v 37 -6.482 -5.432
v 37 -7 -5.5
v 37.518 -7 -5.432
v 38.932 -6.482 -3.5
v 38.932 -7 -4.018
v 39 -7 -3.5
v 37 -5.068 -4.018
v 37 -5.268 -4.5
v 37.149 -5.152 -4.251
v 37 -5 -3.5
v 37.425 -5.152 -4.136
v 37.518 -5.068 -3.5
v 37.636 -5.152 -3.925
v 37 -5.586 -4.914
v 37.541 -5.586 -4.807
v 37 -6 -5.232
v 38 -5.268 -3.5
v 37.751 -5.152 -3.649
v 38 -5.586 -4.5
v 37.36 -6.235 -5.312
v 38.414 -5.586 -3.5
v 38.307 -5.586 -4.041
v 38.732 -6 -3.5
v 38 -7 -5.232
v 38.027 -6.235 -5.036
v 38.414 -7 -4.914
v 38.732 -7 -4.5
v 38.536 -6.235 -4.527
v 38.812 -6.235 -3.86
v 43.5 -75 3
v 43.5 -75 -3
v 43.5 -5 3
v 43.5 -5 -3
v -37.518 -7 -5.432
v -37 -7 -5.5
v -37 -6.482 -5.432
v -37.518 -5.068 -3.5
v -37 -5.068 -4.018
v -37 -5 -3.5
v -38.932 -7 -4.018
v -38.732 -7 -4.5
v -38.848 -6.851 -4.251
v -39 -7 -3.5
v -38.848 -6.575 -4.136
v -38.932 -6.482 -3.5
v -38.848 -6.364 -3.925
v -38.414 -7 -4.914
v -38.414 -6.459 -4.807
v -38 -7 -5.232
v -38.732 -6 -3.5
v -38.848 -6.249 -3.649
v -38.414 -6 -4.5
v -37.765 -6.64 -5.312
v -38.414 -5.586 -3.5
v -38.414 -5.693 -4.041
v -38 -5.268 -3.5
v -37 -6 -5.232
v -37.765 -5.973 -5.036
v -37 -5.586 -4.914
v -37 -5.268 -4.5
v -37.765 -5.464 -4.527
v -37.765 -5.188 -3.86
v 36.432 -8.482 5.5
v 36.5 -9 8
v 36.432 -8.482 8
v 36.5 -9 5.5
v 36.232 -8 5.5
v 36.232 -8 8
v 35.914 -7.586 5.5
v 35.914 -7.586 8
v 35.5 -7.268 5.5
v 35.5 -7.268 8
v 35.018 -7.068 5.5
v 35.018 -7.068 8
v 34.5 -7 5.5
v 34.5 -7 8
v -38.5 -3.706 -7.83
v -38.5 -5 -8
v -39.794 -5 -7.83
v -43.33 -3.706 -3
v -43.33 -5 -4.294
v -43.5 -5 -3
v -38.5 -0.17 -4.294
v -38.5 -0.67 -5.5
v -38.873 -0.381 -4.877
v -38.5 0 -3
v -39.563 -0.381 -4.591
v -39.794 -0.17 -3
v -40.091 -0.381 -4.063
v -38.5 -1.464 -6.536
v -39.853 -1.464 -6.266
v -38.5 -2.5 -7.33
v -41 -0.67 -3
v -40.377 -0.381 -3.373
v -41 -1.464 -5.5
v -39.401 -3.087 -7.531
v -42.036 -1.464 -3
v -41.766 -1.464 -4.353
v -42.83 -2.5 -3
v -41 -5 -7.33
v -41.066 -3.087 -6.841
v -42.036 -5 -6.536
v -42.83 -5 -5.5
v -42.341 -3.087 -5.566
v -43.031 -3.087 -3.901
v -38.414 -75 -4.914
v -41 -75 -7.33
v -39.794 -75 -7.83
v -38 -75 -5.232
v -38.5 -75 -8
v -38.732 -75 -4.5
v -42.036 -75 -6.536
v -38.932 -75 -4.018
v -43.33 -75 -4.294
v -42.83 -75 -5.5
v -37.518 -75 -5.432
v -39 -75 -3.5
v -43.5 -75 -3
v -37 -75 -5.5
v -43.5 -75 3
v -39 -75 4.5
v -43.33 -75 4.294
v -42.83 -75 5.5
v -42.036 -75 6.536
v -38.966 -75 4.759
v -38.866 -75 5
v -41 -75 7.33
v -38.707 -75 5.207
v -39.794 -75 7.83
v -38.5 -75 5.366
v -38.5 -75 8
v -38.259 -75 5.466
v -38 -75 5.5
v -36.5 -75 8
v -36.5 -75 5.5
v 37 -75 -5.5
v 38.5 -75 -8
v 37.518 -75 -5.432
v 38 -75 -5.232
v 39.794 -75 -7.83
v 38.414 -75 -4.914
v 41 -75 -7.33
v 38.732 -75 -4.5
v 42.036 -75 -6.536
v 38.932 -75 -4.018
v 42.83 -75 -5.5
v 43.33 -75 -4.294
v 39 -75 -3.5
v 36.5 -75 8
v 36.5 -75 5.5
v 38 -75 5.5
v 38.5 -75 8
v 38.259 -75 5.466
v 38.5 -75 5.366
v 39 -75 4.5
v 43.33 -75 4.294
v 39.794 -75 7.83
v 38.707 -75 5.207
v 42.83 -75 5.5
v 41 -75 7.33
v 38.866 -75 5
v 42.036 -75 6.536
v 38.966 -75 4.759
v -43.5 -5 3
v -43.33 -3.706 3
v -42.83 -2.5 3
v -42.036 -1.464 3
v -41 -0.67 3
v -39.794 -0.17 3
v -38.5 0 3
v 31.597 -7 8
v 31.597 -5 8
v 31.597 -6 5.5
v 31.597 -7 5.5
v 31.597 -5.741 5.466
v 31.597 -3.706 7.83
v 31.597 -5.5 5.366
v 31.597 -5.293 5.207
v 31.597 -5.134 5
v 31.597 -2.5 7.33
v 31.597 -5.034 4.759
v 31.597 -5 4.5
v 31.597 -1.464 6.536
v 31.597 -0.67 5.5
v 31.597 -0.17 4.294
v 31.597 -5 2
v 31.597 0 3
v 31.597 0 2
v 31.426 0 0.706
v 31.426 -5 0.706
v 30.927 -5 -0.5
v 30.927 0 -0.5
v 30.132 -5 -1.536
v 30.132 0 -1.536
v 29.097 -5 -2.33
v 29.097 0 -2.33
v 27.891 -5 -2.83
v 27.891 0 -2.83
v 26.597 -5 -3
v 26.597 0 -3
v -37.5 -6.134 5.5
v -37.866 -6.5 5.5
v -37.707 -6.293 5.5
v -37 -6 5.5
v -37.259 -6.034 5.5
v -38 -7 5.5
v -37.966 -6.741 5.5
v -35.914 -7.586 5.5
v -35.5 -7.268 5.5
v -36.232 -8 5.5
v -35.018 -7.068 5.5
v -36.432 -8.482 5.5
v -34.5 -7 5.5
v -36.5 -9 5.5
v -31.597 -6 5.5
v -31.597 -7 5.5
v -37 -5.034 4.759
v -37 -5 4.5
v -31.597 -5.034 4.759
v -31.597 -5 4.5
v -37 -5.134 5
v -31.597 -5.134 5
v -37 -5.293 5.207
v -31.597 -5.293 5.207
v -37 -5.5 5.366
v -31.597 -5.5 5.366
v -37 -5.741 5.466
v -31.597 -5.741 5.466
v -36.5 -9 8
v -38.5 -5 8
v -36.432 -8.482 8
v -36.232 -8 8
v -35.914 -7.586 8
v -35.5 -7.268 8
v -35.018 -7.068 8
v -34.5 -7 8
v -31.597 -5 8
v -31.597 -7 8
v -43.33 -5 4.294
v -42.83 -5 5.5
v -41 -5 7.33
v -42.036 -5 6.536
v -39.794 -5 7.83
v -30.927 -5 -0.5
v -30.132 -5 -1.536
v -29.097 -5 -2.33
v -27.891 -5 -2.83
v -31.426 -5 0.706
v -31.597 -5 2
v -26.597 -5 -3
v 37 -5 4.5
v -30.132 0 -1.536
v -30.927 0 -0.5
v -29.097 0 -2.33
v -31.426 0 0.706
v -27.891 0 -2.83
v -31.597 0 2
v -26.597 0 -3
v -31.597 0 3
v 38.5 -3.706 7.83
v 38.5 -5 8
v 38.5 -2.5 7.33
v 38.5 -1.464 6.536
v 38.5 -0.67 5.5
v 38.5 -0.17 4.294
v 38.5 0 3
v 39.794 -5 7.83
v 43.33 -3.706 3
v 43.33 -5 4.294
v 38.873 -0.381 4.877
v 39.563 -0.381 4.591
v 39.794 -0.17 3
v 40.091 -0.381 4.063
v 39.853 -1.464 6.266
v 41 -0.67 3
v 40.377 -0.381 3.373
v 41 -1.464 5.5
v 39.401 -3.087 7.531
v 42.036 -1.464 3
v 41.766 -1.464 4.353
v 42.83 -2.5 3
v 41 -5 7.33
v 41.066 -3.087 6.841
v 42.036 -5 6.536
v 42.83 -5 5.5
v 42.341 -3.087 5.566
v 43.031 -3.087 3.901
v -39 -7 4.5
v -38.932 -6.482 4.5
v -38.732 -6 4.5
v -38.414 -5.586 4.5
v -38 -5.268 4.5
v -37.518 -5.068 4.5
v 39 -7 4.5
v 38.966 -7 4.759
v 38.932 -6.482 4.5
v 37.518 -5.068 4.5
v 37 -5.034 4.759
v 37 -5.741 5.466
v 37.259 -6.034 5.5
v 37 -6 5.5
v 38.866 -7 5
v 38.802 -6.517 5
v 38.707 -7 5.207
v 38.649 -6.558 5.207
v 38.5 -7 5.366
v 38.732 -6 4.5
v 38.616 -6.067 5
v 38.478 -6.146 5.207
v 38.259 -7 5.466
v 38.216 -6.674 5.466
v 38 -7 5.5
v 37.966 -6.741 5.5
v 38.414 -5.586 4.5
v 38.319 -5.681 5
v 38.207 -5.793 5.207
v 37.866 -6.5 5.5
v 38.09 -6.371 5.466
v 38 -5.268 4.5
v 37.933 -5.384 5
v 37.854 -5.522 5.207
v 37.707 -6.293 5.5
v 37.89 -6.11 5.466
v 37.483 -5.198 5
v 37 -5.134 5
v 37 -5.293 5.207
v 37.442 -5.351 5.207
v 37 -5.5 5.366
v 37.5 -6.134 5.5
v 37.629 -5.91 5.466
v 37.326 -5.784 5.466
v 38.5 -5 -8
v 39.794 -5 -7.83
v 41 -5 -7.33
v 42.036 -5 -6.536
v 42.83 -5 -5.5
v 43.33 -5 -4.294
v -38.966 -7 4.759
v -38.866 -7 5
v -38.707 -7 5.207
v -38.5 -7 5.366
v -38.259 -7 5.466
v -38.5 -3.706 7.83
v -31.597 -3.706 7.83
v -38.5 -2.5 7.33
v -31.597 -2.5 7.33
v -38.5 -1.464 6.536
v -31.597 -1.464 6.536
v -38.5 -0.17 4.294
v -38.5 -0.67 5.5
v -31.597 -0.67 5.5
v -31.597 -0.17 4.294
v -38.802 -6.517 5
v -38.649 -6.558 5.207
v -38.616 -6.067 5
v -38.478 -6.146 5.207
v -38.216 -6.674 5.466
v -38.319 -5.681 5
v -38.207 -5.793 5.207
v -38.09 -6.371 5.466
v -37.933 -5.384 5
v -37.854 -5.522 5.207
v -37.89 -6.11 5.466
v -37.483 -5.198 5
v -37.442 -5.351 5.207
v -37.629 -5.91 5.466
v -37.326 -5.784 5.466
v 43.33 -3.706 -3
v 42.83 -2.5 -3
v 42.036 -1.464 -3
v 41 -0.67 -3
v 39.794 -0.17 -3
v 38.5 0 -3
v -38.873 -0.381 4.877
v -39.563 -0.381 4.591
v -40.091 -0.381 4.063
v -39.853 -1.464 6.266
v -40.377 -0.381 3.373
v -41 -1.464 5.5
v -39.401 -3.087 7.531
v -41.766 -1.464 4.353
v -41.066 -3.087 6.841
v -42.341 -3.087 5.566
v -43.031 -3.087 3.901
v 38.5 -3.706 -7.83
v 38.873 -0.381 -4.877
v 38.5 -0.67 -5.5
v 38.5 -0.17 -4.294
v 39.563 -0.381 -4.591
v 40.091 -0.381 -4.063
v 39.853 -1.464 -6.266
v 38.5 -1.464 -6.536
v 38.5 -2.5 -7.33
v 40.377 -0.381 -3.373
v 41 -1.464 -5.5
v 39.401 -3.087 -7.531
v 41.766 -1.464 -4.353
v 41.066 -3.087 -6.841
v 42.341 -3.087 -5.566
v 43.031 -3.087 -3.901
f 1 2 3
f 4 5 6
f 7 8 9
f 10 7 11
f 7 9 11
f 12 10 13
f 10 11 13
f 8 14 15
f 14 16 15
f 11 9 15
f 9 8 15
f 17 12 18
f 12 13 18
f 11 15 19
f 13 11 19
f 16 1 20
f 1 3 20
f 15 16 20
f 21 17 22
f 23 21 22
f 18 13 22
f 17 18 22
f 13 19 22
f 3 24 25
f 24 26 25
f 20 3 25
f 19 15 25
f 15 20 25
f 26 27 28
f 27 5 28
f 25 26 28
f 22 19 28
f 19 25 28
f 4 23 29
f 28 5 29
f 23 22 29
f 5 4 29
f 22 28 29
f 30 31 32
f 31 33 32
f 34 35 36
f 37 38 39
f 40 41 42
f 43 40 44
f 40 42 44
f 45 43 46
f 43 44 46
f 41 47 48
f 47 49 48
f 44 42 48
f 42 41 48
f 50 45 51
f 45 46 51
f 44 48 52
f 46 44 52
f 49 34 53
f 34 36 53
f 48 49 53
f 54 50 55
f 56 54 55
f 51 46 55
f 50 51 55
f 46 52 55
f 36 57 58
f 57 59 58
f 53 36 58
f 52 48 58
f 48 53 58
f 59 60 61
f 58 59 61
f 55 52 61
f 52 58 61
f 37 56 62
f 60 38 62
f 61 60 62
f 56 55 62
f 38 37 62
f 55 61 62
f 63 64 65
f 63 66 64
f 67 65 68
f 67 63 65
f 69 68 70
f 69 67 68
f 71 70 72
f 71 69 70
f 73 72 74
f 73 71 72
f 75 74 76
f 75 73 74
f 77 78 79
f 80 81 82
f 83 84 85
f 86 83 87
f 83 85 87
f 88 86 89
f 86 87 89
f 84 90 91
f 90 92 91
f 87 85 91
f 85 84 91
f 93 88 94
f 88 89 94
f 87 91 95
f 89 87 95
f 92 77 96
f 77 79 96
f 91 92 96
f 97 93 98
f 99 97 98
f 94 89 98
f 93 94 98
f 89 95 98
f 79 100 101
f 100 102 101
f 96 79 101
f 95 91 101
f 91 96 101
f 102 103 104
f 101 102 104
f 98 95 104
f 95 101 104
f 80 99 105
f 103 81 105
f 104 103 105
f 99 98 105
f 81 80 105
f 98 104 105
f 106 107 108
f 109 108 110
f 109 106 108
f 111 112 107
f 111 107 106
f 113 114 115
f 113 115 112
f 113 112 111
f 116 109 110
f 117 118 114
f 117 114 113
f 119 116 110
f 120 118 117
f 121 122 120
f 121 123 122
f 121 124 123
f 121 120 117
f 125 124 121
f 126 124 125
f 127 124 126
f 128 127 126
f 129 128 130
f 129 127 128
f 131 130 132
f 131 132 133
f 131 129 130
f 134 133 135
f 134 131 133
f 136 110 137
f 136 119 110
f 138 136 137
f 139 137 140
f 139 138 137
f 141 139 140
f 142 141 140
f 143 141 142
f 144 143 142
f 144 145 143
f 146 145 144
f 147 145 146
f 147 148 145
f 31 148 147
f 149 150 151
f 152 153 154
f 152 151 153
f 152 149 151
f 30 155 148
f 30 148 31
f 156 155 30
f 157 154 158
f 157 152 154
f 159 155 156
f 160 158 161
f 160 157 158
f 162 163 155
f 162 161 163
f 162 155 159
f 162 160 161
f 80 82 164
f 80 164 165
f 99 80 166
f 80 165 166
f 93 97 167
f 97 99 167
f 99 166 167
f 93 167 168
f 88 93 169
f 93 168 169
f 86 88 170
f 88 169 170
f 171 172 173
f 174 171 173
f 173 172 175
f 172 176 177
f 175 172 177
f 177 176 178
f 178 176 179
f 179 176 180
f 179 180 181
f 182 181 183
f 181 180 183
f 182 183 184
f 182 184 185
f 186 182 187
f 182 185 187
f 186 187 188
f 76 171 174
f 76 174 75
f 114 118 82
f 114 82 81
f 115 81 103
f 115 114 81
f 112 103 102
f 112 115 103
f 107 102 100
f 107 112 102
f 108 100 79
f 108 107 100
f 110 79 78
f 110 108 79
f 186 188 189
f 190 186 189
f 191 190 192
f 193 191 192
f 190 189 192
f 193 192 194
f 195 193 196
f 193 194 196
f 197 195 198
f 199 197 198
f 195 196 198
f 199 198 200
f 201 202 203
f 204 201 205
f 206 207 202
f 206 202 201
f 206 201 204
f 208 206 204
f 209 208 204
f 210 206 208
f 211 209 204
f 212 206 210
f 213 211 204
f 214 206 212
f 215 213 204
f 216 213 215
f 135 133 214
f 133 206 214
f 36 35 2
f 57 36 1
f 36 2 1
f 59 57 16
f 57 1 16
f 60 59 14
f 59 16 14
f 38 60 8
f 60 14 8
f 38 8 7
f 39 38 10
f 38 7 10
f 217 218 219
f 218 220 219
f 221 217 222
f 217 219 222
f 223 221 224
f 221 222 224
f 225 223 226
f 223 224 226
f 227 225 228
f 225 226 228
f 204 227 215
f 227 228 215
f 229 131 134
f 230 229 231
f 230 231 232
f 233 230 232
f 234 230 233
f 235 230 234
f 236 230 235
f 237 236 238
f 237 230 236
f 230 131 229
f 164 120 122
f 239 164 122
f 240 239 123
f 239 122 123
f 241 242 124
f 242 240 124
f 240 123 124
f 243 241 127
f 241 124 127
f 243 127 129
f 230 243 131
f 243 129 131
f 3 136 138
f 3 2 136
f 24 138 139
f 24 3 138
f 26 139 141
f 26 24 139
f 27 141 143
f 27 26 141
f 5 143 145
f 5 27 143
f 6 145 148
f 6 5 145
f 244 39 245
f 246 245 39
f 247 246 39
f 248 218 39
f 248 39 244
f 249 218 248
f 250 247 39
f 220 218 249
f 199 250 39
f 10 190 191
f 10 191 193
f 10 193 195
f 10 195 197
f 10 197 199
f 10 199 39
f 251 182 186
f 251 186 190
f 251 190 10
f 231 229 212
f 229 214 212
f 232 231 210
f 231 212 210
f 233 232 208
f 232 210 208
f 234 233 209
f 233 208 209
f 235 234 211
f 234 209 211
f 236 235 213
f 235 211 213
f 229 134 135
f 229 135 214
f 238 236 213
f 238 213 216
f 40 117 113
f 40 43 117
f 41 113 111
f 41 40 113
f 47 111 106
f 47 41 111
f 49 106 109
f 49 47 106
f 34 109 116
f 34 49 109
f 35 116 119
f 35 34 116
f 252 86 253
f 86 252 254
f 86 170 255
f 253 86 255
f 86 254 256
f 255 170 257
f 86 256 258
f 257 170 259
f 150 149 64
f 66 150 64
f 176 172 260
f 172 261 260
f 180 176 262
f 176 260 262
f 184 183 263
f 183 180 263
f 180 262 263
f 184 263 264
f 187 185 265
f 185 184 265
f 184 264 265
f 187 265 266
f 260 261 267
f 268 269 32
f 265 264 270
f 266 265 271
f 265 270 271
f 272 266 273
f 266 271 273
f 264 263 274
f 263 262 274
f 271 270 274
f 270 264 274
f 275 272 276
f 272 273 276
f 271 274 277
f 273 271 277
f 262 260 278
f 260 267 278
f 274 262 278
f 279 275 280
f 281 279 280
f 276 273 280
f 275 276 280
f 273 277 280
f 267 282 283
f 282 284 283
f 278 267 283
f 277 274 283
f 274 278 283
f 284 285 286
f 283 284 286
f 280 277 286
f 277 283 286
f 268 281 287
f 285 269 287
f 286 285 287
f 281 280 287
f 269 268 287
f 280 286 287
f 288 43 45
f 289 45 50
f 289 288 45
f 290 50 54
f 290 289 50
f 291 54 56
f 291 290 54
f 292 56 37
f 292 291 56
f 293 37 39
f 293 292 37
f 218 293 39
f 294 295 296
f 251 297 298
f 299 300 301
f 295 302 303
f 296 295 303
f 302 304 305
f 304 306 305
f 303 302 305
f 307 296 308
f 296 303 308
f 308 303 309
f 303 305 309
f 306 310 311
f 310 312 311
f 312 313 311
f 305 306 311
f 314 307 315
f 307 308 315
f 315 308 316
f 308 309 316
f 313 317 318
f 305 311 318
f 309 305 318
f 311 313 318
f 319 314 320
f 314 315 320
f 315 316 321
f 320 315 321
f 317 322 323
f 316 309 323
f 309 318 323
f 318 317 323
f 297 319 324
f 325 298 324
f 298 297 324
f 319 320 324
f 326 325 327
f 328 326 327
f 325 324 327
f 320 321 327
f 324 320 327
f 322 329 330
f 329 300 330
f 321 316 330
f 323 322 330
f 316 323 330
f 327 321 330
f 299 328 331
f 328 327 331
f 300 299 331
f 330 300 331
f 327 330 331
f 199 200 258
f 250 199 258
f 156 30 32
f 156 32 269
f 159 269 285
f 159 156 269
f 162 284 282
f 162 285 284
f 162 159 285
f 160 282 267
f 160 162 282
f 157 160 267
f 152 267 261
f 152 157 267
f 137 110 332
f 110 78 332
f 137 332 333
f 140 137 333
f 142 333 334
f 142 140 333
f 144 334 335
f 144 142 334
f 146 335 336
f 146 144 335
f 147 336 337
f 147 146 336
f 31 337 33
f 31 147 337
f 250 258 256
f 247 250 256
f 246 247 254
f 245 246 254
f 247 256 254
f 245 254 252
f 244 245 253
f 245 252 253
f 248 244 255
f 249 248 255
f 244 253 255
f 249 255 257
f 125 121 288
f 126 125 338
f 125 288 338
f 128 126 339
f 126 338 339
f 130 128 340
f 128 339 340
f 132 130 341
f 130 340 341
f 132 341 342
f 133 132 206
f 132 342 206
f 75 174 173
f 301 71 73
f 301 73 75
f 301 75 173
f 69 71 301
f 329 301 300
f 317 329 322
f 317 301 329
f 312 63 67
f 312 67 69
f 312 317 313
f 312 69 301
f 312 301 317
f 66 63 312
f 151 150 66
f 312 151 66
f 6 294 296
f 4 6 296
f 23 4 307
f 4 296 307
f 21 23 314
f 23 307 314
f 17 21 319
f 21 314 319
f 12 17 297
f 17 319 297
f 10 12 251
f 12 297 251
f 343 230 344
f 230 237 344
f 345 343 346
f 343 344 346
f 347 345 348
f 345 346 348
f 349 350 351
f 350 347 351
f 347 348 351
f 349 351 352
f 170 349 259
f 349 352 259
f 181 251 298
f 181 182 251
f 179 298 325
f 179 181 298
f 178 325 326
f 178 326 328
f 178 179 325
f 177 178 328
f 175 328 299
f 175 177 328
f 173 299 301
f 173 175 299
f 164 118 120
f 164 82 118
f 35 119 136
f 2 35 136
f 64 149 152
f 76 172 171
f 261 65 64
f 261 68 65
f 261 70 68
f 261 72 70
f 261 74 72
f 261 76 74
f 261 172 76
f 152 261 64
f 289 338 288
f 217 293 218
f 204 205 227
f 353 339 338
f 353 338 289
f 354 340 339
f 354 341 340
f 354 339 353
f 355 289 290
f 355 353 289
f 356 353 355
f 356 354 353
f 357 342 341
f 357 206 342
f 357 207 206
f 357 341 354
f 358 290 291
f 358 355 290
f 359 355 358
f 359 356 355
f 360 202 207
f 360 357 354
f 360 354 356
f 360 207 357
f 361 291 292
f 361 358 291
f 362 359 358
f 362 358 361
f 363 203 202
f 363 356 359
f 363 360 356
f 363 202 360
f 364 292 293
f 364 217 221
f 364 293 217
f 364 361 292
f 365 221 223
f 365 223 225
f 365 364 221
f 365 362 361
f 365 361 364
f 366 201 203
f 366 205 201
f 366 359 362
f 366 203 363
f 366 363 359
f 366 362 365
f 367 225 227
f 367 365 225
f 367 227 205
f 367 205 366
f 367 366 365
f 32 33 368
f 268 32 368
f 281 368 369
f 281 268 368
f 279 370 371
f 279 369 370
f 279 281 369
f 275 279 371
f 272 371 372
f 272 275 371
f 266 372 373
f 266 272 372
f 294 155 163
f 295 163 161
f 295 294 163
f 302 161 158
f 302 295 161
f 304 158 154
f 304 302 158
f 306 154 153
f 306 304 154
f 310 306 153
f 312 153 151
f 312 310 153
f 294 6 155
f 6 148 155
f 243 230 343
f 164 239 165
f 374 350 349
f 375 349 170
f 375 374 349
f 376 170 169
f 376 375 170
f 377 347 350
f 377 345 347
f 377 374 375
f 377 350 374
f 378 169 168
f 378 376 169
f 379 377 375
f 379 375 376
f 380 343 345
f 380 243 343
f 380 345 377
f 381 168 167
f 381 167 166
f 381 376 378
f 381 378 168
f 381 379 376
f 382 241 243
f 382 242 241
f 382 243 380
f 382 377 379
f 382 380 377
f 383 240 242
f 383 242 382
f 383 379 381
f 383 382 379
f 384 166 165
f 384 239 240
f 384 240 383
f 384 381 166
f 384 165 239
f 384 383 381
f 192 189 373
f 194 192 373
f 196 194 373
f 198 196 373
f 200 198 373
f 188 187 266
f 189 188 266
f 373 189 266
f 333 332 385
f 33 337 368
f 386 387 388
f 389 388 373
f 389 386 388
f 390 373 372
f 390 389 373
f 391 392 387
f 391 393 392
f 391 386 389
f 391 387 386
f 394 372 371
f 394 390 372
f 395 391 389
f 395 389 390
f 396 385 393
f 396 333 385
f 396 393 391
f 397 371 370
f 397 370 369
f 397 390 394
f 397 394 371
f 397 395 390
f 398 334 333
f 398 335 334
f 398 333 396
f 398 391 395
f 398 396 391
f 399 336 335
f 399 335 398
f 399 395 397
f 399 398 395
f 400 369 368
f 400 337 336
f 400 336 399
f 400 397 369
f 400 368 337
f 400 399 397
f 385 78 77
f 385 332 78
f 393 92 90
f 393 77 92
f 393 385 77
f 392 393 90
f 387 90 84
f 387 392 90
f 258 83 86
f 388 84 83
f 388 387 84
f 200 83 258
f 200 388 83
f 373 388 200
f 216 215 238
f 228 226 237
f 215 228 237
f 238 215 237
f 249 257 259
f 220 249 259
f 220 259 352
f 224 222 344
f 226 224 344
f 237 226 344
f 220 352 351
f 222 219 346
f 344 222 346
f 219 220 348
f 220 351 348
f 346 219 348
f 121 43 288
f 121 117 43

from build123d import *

# Parameters (mm, degrees)
F0_W     = 87
F0_H     = 16
F1_DEPTH = 75
F2_R     = 5
F3_W     = 78
F3_H     = 11
F4_DEPTH = 70
F5_W     = 73
F5_H     = 68
F6_DEPTH = 2.5
F7_R     = 2
F8_W     = 63.19318
F8_H     = 17.0015
F9_DEPTH = 25
F10_R    = 1


with BuildPart() as f1:
    # F0 (on Front) → F1 (new body)
    with BuildSketch(Plane.XZ):
        Rectangle(F0_W, F0_H)
    extrude(amount=F1_DEPTH)

    # F2
    f2_edges = [f1.edges().sort_by_distance(p)[0] for p in [
        (-43.5, -37.5, 8),
        (43.5, -37.5, 8),
        (43.5, -37.5, -8),
        (-43.5, -37.5, -8),
        (0, 0, 8),
        (0, 0, -8),
        (-43.5, 0, 0),
        (43.5, 0, 0),
    ]]
    fillet(f2_edges, radius=F2_R)

    # F3 (on face) → F4 (cut)
    with BuildSketch(Plane.XZ.offset(75)):
        Rectangle(F3_W, F3_H)
    extrude(amount=-F4_DEPTH, mode=Mode.SUBTRACT)

    # F5 (on face) → F6 (cut, through all)
    with BuildSketch(Plane.XY.offset(8)):
        with Locations((0, -41)):
            Rectangle(F5_W, F5_H)
    extrude(amount=-F6_DEPTH, mode=Mode.SUBTRACT)

    # F7
    f7_edges = [f1.edges().sort_by_distance(p)[0] for p in [
        (36.5, -7, 6.75),
        (-36.5, -7, 6.75),
        (39, -40, -5.5),
        (0, -5, -5.5),
        (-39, -40, -5.5),
        (-39, -5, 0),
        (39, -5, 0),
    ]]
    fillet(f7_edges, radius=F7_R)

    # F8 (on face) → F9 (cut)
    with BuildSketch(Plane(origin=(0, 0, 0), x_dir=(-1, 0, 0), z_dir=(0, 1, 0))):
        with BuildLine():
            ThreePointArc((-31.59659, 2), (-30.132124, -1.535534), (-26.59659, -3))
            Line((-26.59659, -3), (26.59659, -3))
            ThreePointArc((26.59659, -3), (30.132124, -1.535534), (31.59659, 2))
            Line((31.59659, 2), (31.59659, 3))
            Line((31.59659, 3), (-31.59659, 3))
            Line((-31.59659, 3), (-31.59659, 2))
        make_face()
        with Locations((0, 11.50075)):
            Rectangle(F8_W, F8_H)
    extrude(amount=-F9_DEPTH, mode=Mode.SUBTRACT)

    # F10
    f10_edges = [f1.edges().sort_by_distance(p)[0] for p in [
        (39, -41, 5.5),
        (-39, -41, 5.5),
    ]]
    fillet(f10_edges, radius=F10_R)


solid = f1.part
